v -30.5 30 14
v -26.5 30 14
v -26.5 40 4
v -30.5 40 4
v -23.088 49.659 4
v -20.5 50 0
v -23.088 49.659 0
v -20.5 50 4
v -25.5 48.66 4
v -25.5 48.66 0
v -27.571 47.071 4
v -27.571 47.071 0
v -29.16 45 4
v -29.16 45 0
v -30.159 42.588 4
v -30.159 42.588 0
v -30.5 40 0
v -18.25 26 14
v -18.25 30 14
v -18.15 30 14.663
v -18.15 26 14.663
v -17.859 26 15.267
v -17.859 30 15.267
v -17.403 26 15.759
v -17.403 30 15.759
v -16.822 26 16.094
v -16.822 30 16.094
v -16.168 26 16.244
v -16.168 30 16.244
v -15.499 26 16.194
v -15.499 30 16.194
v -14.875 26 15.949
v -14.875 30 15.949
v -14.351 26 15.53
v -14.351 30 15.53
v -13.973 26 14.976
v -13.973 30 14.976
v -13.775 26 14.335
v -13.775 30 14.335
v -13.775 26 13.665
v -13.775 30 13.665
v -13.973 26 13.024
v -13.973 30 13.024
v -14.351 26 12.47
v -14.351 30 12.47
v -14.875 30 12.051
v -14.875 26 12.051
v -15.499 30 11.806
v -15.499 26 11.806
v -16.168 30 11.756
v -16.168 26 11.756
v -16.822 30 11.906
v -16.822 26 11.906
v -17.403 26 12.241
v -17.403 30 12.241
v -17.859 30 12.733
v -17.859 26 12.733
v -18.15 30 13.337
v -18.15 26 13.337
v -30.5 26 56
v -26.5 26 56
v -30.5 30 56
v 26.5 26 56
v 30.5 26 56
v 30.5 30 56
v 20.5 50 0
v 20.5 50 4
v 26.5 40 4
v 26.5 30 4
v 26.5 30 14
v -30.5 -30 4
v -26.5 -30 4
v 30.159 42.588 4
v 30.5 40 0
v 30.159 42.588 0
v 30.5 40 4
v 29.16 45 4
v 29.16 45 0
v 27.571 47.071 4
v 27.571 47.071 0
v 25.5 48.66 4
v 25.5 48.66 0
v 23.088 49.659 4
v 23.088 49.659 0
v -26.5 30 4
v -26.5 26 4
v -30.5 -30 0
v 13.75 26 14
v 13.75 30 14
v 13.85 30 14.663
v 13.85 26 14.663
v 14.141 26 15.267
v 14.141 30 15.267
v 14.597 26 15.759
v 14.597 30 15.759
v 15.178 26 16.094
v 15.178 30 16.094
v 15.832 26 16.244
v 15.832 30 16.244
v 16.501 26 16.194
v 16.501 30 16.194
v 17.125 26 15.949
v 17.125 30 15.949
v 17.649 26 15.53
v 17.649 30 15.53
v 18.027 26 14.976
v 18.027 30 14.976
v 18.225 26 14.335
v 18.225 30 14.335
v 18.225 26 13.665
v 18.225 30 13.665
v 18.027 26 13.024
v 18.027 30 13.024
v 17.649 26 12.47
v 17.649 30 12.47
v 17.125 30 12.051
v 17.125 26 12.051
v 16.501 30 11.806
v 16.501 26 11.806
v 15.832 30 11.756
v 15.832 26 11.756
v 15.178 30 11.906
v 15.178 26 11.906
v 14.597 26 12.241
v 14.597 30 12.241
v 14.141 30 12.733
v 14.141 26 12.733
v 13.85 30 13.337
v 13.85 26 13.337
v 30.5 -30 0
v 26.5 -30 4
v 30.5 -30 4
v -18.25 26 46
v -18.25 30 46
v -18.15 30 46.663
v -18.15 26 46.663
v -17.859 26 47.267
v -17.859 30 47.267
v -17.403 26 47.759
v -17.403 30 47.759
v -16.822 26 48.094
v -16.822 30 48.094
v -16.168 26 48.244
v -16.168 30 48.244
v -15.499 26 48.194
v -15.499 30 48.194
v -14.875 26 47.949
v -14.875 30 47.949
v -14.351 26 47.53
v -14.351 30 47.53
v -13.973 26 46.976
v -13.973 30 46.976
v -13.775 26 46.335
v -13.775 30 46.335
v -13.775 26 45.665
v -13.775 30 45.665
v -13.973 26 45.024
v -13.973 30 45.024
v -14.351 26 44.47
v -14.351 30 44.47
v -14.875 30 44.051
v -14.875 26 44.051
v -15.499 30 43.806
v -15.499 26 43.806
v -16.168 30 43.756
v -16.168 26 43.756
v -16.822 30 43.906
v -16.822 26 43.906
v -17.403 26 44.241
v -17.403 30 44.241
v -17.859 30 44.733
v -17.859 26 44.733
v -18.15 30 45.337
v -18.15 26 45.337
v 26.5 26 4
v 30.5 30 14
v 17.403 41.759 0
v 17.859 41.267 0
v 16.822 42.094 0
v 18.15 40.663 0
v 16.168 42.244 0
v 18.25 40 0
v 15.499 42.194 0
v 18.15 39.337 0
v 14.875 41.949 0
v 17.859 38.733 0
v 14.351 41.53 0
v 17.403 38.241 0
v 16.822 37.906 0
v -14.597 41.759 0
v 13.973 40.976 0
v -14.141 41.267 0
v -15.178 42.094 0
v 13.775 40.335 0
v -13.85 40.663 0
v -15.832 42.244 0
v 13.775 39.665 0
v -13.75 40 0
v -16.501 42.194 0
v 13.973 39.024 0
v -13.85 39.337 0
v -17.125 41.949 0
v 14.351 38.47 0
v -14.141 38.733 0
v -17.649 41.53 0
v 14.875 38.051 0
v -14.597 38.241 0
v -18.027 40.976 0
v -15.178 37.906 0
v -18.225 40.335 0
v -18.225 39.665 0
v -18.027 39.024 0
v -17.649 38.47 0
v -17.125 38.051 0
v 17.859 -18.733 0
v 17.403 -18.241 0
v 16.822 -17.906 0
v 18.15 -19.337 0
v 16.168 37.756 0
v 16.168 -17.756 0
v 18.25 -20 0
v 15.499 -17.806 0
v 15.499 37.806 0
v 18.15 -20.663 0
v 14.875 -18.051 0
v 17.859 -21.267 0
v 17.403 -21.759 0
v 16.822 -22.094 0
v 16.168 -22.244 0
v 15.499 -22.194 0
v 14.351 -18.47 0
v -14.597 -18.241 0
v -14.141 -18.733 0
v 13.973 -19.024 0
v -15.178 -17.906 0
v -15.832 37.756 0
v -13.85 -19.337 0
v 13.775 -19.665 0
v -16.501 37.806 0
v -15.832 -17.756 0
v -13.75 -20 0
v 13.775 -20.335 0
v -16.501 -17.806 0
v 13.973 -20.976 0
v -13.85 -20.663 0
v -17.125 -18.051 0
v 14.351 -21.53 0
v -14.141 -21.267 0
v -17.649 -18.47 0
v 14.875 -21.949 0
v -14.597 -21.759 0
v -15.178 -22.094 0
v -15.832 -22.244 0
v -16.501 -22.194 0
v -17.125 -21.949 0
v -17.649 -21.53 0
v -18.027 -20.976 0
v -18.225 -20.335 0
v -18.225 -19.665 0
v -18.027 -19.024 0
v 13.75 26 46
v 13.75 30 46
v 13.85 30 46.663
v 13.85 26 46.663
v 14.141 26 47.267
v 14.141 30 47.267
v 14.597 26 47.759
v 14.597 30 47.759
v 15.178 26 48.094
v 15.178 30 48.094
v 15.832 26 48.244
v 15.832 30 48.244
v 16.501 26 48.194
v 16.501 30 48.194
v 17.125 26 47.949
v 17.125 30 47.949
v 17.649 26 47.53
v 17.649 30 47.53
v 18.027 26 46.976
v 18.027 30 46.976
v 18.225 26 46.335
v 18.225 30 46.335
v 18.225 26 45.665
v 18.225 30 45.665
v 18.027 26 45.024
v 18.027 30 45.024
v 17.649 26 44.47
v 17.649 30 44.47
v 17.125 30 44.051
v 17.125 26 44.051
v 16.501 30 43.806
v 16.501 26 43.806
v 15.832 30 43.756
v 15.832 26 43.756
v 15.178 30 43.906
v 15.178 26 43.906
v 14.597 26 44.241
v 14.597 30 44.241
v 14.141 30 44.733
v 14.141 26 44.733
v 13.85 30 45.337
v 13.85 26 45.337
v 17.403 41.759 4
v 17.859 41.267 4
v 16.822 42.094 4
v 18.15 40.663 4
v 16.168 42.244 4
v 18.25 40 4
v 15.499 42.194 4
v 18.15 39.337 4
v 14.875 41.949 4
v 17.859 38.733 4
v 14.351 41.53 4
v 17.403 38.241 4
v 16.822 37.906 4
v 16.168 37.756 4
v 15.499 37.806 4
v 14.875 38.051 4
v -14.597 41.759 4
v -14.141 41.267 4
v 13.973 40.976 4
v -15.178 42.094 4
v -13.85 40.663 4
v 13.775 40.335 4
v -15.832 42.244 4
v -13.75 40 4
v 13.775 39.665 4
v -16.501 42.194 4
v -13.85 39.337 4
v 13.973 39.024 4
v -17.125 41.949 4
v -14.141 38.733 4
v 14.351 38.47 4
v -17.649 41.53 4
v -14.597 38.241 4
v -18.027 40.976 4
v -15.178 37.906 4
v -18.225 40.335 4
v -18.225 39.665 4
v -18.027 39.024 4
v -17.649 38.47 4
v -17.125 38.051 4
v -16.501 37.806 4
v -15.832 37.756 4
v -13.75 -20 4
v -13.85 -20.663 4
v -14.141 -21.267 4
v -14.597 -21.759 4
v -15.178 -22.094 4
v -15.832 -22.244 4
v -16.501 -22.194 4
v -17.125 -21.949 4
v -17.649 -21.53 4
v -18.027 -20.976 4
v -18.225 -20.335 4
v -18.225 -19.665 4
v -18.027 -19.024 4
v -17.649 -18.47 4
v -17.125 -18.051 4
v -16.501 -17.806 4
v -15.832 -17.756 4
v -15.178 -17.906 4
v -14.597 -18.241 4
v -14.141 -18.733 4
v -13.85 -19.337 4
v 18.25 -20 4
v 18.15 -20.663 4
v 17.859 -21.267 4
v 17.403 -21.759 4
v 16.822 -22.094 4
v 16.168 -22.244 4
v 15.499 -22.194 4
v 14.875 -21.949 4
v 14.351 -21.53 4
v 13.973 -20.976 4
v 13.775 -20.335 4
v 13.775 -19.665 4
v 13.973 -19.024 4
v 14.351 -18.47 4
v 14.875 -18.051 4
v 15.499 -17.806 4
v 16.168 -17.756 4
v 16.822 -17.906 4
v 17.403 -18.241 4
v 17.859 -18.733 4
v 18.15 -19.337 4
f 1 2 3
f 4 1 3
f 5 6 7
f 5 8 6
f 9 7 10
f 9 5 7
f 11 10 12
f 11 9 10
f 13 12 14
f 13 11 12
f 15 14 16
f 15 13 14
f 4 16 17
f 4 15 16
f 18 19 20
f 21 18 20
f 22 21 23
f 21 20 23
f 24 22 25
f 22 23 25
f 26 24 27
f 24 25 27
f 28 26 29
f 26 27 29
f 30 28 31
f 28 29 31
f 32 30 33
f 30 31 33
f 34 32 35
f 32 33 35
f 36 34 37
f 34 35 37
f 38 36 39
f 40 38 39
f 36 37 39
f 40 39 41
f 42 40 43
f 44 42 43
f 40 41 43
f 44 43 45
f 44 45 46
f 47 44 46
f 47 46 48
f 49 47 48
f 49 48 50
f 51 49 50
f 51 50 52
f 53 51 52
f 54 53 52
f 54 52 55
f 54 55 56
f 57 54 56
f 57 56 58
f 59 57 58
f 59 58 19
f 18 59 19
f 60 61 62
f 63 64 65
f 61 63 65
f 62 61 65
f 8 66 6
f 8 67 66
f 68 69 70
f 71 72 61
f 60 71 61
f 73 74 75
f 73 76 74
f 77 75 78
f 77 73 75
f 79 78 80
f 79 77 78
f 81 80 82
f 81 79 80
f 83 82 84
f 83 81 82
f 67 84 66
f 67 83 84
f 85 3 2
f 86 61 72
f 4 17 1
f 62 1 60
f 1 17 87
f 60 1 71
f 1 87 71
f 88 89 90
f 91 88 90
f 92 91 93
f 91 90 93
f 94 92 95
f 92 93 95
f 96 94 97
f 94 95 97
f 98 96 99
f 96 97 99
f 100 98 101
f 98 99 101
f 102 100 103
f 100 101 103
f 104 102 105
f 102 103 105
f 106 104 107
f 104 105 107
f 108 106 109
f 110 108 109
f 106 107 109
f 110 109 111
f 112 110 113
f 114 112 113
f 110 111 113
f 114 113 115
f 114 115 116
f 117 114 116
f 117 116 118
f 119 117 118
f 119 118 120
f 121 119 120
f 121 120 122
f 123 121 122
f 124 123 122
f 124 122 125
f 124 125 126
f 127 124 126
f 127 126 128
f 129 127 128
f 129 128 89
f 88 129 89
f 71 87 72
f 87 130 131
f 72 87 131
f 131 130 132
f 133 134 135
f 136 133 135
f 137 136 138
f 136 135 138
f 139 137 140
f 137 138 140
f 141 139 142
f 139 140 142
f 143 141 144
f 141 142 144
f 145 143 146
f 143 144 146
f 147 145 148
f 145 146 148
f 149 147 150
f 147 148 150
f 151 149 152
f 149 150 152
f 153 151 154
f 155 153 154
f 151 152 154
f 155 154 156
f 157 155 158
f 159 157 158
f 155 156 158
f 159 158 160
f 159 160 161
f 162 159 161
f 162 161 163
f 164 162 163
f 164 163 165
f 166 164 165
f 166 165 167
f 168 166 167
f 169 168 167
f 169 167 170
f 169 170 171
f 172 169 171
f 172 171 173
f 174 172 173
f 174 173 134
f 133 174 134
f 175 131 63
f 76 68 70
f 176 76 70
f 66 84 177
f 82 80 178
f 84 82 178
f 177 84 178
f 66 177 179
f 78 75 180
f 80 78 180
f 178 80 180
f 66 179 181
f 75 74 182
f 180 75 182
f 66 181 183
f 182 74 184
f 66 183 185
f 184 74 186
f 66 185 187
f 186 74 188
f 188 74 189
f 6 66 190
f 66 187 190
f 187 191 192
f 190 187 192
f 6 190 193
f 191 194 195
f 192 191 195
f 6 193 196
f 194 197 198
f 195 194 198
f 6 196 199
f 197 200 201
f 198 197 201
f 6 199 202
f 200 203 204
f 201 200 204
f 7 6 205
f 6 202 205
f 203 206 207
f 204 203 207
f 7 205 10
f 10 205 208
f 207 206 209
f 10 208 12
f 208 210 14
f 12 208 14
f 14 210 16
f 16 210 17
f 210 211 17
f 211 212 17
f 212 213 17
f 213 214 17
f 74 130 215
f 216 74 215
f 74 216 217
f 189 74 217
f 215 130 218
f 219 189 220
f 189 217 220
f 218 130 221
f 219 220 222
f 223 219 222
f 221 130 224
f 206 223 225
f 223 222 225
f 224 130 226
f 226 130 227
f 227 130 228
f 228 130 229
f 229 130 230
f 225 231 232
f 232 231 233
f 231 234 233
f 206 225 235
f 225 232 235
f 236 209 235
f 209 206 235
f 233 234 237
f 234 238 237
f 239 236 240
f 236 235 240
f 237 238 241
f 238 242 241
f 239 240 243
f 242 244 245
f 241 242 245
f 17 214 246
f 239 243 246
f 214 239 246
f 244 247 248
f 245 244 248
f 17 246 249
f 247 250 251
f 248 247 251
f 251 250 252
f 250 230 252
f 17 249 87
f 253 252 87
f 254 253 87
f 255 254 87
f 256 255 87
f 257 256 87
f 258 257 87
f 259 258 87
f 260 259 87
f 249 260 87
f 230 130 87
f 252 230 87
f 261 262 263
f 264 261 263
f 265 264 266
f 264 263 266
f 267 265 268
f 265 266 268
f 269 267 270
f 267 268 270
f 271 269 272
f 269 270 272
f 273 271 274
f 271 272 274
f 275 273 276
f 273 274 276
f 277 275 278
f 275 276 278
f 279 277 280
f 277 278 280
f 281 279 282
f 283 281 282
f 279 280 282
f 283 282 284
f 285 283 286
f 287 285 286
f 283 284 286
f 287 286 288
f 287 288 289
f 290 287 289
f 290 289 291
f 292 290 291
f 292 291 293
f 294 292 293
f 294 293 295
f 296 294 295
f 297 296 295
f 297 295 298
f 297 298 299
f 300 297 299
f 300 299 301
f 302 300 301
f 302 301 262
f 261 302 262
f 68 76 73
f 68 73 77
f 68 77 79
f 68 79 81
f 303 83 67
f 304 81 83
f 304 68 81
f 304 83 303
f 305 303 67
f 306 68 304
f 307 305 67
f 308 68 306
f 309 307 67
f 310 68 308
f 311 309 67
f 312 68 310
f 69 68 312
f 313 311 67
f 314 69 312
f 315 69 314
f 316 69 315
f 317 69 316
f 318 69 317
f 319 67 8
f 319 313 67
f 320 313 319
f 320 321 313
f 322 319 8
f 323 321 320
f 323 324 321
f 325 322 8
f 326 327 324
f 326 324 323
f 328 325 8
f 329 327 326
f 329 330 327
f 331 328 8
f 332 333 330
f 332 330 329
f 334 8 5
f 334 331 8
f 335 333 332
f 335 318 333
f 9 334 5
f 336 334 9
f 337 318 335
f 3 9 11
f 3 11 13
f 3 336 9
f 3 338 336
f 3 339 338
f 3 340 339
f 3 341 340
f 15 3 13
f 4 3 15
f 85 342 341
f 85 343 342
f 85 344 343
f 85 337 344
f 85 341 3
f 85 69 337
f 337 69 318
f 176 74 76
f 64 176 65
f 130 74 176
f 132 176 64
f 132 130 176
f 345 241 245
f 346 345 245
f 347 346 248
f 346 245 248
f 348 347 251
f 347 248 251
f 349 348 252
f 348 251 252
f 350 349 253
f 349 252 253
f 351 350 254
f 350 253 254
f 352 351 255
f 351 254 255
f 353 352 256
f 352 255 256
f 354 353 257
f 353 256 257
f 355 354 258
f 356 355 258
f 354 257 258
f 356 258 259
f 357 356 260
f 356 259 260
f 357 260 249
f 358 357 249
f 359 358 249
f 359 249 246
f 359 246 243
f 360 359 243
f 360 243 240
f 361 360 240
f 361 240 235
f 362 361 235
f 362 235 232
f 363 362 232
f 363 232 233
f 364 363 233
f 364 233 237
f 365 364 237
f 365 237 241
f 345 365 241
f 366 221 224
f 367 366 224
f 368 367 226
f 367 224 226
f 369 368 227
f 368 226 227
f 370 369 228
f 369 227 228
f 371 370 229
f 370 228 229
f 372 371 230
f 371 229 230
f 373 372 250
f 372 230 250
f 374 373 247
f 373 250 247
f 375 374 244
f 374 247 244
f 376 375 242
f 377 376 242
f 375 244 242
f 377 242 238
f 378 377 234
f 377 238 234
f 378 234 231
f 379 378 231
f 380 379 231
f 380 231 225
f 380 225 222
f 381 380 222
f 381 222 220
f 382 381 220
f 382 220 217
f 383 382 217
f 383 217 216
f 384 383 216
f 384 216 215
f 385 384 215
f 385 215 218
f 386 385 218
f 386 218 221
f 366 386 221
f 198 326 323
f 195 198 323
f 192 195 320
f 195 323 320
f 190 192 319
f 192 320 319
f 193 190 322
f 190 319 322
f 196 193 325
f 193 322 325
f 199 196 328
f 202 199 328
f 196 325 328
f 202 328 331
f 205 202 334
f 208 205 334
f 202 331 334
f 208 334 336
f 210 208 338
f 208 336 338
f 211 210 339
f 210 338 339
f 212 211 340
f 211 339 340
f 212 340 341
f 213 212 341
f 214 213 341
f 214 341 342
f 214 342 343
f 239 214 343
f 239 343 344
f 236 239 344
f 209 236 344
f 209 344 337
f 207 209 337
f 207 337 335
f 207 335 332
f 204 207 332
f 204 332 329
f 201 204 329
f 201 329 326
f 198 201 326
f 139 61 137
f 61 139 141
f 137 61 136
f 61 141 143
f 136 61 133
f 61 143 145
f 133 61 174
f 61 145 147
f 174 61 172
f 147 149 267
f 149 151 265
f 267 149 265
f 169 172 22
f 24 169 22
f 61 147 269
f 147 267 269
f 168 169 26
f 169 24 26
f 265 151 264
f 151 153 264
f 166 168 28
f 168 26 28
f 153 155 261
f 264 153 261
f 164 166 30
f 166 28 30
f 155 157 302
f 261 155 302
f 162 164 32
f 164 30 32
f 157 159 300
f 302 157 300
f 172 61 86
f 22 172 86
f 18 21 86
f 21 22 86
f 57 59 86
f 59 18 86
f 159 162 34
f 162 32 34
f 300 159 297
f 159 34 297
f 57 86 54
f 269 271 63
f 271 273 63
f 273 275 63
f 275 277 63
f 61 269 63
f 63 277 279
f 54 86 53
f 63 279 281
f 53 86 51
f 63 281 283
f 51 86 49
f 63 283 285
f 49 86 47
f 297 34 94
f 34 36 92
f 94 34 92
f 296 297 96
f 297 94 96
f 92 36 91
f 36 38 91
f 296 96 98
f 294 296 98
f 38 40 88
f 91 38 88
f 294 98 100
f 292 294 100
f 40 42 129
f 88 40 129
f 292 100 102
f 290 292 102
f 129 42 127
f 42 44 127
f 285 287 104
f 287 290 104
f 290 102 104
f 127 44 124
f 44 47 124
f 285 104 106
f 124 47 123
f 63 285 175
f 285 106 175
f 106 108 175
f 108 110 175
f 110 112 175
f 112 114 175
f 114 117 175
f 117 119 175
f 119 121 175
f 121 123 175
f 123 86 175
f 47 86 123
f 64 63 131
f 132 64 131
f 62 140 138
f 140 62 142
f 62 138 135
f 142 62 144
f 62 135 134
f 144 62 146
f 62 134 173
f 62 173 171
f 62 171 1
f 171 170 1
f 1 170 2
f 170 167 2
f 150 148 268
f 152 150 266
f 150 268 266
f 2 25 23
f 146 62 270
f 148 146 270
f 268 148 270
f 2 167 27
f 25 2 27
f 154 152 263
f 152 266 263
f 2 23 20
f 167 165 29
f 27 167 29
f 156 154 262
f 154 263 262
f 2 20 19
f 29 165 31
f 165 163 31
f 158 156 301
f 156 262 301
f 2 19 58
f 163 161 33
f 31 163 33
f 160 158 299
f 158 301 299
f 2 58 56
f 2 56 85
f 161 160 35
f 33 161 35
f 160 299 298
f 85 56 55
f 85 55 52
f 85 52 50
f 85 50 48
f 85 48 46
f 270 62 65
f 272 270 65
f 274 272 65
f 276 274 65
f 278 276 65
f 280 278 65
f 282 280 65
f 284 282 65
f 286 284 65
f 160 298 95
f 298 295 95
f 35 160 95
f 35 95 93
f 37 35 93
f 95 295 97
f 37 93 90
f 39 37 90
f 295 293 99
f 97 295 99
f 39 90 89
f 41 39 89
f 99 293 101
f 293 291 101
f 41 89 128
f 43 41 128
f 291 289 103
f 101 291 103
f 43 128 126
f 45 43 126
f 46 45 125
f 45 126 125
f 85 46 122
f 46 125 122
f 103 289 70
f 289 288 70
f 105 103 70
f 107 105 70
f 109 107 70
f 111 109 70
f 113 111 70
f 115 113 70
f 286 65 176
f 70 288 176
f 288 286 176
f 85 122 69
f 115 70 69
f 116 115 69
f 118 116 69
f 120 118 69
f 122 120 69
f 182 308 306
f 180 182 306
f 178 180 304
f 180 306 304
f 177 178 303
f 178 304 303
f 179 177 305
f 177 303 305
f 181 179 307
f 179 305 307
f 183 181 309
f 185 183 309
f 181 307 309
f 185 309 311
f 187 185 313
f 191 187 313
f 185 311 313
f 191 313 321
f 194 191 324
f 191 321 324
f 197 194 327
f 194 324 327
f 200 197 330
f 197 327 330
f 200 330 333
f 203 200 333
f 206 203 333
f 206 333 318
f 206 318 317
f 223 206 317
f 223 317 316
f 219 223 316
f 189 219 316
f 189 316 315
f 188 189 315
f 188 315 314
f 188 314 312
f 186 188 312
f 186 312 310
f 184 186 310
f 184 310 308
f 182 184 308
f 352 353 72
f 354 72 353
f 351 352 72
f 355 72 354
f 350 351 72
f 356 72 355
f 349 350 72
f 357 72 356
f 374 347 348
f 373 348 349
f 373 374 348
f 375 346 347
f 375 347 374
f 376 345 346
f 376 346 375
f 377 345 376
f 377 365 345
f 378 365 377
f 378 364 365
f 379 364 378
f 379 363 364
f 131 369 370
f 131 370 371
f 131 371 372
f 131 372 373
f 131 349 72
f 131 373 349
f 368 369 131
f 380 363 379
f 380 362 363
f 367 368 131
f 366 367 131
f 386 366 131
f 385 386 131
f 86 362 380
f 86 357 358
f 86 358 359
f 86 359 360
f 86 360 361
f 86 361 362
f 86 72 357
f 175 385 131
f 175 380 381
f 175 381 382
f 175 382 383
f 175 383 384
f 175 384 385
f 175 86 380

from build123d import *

# Parameters (mm, degrees)
F0_W      = 53
F0_H      = 60
F1_DEPTH  = 4
F2_W      = 53
F2_H      = 4
F3_DEPTH  = 52
F4_R      = 2.25
F5_DEPTH  = 56.001
F6_R      = 2.25
F7_DEPTH  = 60.001
F9_DEPTH  = 4
F11_DEPTH = 4
F12_W     = 61
F12_H     = 4
F13_DEPTH = 20
F14_R     = 2.25
F15_DEPTH = 4.001
F16_R     = 10


# Not quite as in the source:
# - a feature names something its author has since deleted; it is built from what else it names


with BuildPart() as f1:
    # F0 (on Top) → F1 (new body)
    with BuildSketch(Plane.XY):
        Rectangle(F0_W, F0_H)
    extrude(amount=F1_DEPTH)

    # F2 (on face) → F3 (join)
    with BuildSketch(Plane.XY.offset(4)):
        with Locations((0, 28)):
            Rectangle(F2_W, F2_H)
    extrude(amount=F3_DEPTH)

    # F4 (on face) → F5 (cut, through all)
    with BuildSketch(Plane(origin=(0, 0, 0), x_dir=(1, 0, 0), z_dir=(0, 0, -1))):
        with Locations((-16, 20)):
            Circle(F4_R)
        with Locations((16, 20)):
            Circle(F4_R)
    extrude(amount=-F5_DEPTH, mode=Mode.SUBTRACT)

    # F6 (on face) → F7 (cut, through all)
    with BuildSketch(Plane(origin=(0, 30, 0), x_dir=(-1, 0, 0), z_dir=(0, 1, 0))):
        with Locations((-16, 14)):
            Circle(F6_R)
        with Locations((-16, 46)):
            Circle(F6_R)
        with Locations((16, 14)):
            Circle(F6_R)
        with Locations((16, 46)):
            Circle(F6_R)
    extrude(amount=-F7_DEPTH, mode=Mode.SUBTRACT)

    # F8 (on face) → F9 (join)
    with BuildSketch(Plane.YZ.offset(26.5)):
        Polygon((30, 14), (30, 56), (26, 56), (-30, 4), (-30, 0), (30, 0), (30, 4), align=None)
        Polygon((40, 4), (30, 14), (30, 4), align=None)
    extrude(amount=F9_DEPTH)

    # F10 (on face) → F11 (join)
    with BuildSketch(Plane(origin=(-26.5, 0, 0), x_dir=(0, -1, 0), z_dir=(-1, 0, 0))):
        Polygon((-26, 56), (-30, 56), (-30, 14), (-30, 4), (-30, 0), (30, 0), (30, 4), align=None)
        Polygon((-30, 4), (-30, 14), (-40, 4), align=None)
    extrude(amount=F11_DEPTH)

    # F12 (on face) → F13 (join)
    with BuildSketch(Plane(origin=(0, 30, 0), x_dir=(-1, 0, 0), z_dir=(0, 1, 0))):
        with Locations((0, 2)):
            Rectangle(F12_W, F12_H)
    extrude(amount=F13_DEPTH)

    # F14 (on face) → F15 (cut, through all)
    with BuildSketch(Plane.XY.offset(4)):
        with Locations((16, 40)):
            Circle(F14_R)
        with Locations((-16, 40)):
            Circle(F14_R)
    extrude(amount=-F15_DEPTH, mode=Mode.SUBTRACT)

    # F16
    f16_edges = [f1.edges().sort_by_distance(p)[0] for p in [
        (30.5, 50, 2),
        (-30.5, 50, 2),
    ]]
    fillet(f16_edges, radius=F16_R)


solid = f1.part
